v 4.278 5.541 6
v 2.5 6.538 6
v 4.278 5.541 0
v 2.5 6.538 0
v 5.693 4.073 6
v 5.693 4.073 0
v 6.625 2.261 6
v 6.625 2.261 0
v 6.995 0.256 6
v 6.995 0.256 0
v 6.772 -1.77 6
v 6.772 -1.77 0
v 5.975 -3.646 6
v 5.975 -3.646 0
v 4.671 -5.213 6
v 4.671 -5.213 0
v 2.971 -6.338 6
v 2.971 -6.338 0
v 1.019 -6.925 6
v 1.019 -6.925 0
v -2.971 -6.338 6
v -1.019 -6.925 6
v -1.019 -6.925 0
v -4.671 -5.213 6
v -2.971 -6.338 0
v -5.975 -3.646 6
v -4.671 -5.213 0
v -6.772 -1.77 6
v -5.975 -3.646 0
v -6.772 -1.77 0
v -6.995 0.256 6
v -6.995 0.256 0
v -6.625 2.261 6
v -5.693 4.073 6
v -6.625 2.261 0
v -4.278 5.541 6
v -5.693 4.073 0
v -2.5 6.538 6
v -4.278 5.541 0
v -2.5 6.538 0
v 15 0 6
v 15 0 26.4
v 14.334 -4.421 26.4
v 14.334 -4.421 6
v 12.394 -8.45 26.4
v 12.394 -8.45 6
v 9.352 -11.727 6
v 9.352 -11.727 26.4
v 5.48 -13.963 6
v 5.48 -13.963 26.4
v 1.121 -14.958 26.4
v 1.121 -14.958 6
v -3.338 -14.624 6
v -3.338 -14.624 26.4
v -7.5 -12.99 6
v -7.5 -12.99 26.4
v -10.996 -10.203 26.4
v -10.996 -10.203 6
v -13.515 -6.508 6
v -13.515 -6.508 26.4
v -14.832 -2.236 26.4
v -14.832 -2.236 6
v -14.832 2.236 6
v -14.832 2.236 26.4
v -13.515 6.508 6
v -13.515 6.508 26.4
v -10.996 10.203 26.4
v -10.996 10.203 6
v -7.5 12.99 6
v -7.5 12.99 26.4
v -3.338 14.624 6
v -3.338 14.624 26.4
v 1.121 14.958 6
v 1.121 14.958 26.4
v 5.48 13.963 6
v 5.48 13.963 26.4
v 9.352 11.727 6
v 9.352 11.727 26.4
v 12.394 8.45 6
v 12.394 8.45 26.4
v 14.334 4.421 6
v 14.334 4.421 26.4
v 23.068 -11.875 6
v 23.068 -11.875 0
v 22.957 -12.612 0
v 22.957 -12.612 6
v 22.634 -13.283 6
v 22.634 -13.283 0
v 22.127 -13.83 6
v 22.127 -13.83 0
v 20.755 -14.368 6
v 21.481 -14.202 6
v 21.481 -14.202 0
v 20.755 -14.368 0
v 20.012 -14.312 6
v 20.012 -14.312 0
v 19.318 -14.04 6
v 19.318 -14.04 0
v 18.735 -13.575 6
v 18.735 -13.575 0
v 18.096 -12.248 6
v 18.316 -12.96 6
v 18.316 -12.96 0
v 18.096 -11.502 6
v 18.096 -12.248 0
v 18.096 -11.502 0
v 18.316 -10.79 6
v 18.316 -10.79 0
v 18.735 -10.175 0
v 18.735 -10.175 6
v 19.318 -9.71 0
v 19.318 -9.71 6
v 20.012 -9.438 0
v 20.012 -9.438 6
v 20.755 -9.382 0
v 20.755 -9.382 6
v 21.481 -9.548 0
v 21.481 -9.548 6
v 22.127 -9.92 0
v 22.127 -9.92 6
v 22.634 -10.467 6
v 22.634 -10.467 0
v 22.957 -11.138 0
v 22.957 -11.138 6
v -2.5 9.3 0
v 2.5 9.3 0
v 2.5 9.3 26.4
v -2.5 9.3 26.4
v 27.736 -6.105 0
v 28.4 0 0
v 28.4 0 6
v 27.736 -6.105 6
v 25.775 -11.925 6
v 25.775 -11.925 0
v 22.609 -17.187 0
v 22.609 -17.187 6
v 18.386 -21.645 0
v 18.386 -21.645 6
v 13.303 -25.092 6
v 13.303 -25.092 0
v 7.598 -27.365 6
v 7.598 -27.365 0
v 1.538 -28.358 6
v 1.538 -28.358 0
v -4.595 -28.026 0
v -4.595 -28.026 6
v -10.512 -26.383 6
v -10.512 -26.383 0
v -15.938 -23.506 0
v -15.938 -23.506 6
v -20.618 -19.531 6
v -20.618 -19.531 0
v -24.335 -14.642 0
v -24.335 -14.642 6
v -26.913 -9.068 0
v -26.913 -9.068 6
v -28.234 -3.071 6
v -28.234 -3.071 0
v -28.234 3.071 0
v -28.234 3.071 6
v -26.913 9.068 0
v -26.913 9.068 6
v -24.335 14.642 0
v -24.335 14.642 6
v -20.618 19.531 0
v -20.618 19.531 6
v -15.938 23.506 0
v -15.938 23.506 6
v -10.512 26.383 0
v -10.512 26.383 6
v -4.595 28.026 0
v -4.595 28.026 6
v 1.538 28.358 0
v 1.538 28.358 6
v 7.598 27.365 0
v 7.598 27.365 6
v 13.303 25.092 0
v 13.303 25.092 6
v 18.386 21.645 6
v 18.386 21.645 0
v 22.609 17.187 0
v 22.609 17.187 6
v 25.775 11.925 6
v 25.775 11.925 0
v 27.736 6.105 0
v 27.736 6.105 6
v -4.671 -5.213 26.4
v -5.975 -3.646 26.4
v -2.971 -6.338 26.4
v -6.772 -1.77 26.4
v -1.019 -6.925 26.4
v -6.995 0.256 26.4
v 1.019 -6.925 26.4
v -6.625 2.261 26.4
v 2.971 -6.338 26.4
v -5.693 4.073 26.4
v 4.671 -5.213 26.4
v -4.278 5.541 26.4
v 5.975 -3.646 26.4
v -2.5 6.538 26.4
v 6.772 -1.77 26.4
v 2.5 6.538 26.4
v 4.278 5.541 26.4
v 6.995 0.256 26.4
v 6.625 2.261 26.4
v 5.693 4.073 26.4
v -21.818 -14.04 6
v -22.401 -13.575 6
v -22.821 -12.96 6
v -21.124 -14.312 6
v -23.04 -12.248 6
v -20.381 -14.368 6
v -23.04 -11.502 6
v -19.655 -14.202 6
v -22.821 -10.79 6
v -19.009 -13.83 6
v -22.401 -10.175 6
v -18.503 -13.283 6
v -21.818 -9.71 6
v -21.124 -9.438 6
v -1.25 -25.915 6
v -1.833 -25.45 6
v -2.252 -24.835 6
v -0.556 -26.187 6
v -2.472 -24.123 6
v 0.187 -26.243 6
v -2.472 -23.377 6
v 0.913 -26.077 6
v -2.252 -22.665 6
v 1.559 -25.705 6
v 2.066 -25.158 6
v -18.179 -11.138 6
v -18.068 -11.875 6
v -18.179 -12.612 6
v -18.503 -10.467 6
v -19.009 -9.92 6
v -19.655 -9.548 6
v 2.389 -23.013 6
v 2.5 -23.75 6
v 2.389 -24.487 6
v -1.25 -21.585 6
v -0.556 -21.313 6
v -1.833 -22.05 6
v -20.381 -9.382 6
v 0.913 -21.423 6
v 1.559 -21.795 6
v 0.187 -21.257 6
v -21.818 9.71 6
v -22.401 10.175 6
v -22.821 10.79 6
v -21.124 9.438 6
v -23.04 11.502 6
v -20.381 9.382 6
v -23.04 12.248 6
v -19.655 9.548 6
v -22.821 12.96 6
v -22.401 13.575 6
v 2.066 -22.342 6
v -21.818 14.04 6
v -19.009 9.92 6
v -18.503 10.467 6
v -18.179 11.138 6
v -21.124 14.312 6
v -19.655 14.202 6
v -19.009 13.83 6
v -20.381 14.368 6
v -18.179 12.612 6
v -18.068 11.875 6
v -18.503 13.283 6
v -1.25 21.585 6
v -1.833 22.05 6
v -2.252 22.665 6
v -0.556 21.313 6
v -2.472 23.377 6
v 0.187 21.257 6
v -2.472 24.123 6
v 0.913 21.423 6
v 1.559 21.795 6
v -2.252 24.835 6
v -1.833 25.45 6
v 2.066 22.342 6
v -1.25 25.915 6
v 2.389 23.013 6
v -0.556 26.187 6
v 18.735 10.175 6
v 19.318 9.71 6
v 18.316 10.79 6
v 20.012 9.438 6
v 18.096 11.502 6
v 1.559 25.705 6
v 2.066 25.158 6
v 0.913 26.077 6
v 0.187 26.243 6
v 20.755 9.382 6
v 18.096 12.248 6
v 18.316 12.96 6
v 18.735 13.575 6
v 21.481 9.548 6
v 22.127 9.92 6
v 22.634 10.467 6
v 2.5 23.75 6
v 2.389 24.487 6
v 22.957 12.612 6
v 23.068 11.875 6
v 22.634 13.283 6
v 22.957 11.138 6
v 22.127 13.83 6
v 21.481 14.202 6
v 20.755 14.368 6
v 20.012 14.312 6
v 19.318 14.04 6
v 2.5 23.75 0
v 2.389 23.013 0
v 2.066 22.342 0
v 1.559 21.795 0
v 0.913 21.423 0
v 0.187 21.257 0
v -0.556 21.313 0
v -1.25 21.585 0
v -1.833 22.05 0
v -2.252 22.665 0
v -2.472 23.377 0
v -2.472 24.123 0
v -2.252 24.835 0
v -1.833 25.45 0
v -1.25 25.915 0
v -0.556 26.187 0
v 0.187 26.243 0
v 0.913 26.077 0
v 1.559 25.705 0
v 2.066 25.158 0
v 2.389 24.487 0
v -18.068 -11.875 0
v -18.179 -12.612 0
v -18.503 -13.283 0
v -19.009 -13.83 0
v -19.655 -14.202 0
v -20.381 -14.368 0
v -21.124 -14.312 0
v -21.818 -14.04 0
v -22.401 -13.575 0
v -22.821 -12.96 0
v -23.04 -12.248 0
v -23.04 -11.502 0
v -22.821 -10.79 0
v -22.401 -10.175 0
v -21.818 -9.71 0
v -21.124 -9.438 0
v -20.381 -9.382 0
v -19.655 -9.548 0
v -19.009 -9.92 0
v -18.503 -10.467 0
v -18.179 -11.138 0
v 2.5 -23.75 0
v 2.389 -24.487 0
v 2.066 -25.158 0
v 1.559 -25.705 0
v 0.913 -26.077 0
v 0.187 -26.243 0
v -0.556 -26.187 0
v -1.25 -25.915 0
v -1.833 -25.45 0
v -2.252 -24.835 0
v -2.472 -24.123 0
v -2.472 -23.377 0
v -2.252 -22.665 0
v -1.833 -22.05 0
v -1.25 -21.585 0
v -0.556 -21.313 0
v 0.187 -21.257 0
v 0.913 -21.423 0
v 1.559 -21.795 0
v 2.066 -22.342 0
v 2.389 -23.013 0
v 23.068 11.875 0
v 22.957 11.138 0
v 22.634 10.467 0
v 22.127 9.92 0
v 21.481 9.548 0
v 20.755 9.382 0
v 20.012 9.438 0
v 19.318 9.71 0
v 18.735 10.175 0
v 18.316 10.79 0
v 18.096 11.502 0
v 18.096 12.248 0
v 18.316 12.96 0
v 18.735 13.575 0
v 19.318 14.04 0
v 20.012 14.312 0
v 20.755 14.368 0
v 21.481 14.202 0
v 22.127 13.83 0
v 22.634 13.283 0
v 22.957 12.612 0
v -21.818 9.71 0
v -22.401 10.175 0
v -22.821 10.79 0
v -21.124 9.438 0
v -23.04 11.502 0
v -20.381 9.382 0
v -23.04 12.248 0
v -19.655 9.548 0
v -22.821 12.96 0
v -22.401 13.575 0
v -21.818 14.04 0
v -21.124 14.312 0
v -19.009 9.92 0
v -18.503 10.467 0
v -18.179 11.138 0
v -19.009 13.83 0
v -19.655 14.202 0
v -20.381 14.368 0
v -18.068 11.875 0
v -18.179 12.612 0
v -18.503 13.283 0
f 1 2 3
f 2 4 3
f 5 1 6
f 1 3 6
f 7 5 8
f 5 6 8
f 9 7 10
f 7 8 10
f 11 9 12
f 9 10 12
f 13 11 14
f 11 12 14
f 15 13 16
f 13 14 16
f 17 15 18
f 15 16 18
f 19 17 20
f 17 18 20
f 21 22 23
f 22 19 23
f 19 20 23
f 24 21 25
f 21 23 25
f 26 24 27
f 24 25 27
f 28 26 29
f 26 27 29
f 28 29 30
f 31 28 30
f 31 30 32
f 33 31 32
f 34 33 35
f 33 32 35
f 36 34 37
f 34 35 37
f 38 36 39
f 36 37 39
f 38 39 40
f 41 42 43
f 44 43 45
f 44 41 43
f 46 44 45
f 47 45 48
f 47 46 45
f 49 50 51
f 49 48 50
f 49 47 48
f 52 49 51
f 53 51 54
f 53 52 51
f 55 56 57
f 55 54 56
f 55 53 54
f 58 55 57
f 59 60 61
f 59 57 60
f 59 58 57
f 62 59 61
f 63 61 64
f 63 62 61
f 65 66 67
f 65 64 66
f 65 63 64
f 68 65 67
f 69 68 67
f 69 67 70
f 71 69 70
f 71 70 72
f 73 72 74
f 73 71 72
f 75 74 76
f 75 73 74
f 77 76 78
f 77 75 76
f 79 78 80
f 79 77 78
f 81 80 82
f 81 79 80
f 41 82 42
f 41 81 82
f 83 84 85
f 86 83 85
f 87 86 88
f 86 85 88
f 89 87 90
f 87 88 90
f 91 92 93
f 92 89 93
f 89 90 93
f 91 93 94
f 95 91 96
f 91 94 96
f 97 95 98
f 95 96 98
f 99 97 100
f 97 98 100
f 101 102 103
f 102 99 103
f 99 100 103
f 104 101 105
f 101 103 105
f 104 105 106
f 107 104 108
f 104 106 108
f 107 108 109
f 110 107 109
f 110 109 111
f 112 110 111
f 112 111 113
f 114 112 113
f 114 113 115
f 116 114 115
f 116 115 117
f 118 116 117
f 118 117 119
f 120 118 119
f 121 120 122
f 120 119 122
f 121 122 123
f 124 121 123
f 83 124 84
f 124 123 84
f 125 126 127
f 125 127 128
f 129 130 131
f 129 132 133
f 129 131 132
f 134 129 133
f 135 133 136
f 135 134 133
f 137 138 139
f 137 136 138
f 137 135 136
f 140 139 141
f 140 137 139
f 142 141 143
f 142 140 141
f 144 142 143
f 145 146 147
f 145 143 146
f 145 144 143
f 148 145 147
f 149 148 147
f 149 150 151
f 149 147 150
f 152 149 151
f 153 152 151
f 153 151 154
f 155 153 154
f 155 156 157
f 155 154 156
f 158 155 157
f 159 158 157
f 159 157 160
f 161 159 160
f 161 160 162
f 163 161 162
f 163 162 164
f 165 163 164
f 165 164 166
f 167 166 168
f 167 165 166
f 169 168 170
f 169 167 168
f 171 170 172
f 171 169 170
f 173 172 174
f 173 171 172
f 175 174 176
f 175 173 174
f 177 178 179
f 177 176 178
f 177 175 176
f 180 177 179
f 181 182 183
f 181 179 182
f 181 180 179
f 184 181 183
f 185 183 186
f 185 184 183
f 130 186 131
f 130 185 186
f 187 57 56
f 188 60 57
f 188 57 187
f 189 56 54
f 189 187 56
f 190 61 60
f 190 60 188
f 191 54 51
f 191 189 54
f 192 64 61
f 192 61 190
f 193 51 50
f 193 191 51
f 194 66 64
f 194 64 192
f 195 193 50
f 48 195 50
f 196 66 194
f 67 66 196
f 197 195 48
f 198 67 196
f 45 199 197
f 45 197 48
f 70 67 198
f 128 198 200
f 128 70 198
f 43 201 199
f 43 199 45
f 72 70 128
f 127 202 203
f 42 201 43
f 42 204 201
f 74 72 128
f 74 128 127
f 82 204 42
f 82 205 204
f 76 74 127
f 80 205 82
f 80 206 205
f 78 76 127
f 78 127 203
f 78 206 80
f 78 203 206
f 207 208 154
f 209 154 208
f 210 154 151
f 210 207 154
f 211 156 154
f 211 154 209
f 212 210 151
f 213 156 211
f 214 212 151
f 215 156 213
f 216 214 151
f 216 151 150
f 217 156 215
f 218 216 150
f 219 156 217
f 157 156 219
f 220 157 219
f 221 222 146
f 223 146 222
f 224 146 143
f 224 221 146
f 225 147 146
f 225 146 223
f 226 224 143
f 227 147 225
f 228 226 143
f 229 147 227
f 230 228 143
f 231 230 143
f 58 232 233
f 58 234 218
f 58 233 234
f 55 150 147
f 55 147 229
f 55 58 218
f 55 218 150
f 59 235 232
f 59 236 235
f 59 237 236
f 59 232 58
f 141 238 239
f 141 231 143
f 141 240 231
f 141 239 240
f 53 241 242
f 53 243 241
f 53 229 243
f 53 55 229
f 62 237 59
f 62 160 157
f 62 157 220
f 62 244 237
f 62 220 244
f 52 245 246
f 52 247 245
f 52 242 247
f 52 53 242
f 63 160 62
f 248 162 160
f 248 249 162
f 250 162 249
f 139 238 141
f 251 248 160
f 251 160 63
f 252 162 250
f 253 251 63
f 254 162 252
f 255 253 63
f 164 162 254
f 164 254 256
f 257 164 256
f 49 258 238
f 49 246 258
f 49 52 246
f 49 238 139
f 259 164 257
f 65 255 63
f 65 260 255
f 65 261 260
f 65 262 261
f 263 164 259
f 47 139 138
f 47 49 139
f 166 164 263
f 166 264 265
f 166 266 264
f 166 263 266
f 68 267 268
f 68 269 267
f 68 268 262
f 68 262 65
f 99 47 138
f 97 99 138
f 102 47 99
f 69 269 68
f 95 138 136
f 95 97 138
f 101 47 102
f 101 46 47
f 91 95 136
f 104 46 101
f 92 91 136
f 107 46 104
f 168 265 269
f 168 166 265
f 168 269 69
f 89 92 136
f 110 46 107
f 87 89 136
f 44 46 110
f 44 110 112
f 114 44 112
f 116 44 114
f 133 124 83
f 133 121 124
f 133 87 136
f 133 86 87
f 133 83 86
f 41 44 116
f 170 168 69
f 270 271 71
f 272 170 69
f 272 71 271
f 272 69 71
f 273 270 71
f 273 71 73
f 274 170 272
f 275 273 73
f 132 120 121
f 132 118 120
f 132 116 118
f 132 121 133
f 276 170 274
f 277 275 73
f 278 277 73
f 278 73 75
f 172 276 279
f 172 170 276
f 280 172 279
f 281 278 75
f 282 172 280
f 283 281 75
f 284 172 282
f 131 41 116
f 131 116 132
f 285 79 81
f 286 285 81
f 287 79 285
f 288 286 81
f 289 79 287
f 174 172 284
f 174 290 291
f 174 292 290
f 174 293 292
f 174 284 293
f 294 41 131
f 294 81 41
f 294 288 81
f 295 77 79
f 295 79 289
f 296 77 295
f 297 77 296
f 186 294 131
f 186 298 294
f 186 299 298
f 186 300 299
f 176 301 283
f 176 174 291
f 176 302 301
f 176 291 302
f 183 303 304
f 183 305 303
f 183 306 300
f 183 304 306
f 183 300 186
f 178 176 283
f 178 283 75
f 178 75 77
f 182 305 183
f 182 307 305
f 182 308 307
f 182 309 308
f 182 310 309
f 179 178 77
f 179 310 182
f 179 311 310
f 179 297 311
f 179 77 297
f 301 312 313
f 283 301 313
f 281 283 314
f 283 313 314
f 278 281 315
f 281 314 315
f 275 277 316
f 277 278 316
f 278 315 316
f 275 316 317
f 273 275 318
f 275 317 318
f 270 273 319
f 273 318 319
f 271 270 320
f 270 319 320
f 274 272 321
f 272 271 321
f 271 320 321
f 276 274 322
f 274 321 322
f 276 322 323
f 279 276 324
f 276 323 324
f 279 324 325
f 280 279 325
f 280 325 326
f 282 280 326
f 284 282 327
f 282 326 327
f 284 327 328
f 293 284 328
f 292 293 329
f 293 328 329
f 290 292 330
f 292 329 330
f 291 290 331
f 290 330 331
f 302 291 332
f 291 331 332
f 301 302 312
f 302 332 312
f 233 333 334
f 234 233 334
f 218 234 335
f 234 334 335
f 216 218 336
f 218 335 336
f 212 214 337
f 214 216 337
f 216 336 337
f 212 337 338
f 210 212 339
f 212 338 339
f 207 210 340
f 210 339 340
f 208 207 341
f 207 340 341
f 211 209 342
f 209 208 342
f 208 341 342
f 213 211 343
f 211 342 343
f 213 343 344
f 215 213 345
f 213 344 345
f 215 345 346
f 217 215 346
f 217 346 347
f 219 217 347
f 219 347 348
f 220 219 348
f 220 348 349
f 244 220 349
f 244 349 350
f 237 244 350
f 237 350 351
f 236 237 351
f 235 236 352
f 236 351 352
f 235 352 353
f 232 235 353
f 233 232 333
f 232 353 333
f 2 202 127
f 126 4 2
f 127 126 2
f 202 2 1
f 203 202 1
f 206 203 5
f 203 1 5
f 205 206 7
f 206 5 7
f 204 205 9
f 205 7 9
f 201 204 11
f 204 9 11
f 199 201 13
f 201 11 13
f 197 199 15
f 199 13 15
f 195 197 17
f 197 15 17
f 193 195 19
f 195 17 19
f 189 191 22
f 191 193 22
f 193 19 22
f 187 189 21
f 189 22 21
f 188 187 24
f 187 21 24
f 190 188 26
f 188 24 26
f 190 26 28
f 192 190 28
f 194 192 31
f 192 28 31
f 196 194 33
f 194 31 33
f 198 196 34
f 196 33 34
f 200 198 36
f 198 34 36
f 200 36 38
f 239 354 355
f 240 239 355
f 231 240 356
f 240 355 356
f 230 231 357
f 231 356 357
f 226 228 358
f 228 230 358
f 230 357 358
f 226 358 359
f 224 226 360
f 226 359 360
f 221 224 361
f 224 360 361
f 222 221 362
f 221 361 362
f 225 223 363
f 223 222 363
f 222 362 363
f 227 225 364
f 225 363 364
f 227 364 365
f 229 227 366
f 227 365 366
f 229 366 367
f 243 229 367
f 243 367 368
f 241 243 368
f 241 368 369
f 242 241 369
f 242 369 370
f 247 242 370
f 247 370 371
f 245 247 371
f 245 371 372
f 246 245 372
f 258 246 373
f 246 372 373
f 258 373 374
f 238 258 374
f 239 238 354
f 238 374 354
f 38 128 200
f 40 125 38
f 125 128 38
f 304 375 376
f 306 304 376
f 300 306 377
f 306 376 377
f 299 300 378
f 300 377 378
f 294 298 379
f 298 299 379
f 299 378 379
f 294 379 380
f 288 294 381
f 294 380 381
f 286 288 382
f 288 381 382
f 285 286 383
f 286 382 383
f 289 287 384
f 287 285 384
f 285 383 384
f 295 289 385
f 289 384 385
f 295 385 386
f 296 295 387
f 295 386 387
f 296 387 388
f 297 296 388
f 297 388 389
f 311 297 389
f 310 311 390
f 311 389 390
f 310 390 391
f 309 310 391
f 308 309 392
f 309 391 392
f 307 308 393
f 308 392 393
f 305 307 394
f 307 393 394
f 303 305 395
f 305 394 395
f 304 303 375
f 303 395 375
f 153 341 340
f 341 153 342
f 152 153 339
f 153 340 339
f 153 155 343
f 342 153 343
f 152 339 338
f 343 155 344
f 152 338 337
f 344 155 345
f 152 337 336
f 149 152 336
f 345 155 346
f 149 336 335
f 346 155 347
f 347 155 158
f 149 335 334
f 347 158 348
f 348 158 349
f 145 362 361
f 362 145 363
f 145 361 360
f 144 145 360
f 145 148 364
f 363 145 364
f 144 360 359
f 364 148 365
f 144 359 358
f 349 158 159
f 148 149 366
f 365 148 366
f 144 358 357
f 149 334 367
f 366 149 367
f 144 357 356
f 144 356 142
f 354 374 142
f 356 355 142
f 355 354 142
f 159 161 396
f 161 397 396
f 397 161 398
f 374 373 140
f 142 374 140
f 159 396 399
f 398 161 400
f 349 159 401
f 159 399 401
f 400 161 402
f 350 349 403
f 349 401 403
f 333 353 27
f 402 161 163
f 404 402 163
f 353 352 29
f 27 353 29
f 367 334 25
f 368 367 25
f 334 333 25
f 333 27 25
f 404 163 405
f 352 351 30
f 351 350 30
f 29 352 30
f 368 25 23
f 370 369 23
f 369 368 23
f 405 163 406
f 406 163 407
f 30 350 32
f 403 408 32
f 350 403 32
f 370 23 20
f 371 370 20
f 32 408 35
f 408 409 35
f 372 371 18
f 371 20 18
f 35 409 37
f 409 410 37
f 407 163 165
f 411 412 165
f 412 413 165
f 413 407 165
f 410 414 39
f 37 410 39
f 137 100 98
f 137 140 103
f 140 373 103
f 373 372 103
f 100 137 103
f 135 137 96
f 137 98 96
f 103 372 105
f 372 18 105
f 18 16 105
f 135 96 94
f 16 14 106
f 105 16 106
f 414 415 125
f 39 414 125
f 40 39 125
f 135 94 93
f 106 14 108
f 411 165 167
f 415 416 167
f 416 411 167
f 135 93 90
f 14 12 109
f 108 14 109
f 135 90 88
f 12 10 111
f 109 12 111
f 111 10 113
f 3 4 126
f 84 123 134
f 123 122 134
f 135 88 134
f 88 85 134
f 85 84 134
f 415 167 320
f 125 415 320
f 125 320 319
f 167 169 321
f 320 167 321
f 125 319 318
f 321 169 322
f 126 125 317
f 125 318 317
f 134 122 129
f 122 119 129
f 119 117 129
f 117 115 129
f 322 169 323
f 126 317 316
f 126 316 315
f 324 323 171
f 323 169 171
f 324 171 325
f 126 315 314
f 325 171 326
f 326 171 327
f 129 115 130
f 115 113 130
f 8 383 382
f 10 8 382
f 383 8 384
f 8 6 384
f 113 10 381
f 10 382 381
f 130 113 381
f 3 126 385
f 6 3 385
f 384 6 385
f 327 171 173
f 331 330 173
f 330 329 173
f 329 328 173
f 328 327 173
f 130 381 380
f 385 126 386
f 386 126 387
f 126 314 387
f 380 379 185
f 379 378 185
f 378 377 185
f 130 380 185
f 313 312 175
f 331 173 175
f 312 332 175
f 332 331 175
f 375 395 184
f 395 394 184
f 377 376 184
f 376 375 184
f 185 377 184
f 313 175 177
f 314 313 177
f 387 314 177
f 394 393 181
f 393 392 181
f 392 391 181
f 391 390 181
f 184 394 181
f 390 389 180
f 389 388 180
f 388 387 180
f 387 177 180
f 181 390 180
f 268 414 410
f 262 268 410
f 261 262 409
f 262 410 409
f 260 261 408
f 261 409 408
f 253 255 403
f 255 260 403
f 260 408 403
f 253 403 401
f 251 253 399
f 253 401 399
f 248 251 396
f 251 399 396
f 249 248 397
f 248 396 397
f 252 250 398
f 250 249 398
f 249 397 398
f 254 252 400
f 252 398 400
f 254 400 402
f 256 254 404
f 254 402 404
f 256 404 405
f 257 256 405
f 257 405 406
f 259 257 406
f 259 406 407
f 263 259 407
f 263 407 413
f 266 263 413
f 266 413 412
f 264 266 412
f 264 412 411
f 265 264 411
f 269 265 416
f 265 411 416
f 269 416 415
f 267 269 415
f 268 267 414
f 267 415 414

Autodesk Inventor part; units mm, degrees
ref_plane "YZ Plane" through (0, 0, 0) normal (1, 0, 0) x (0, 1, 0)
ref_plane "XZ Plane" through (0, 0, 0) normal (0, 1, 0) x (-1, 0, 0)
ref_plane "XY Plane" through (0, 0, 0) normal (0, 0, 1) x (1, 0, 0)
sketch "Base" plane through (0, 0, 0) normal (0, 0, 1) x (1, 0, 0)
  circle A0 centre (0, 0) radius 28.4
  circle A1 centre (0, 0) radius 23.75 construction
  circle A2 centre (0, 0) radius 7
  line L0 (-2.5, 0) -> (2.5, 0)
  line L1 (2.5, 0) -> (2.5, 9.3)
  line L2 (2.5, 9.3) -> (-2.5, 9.3)
  line L3 (-2.5, 9.3) -> (-2.5, 0)
  line L4 (0, -39.76) -> (0, 39.76) construction
  circle A3 centre (0, 23.75) radius 2.5
  circle A4 centre (-20.5681, 11.875) radius 2.5
  circle A5 centre (-20.5681, -11.875) radius 2.5
  circle A6 centre (0, -23.75) radius 2.5
  circle A7 centre (20.5681, -11.875) radius 2.5
  circle A8 centre (20.5681, 11.875) radius 2.5
  point P0 (0, 9.3)
  point P1 (2.5, 6.5383)
  point P2 (-2.5, 6.5383)
  dimension "d1" = 47.5
  dimension "d0" = 56.8
  dimension "d2" = 14
  dimension "d3" = 9.3
  dimension "d4" = 5
  dimension "d5" = 5
  dimension "d8" = 360
extrude "BaseFeature" add sketch "Base" along normal blind 6
sketch "Lip" plane through (0, 0, 6) normal (0, 0, 1) x (1, 0, 0)
  arc A0 (-2.5, 6.5383) -> (2.5, 6.5383) centre (0, 0) ccw projected
  circle A1 centre (0, 0) radius 15
  line L0 (-2.5, 6.5383) -> (-2.5, 9.3) projected
  line L1 (2.5, 9.3) -> (2.5, 6.5383) projected
  line L2 (-2.5, 9.3) -> (2.5, 9.3) projected
  dimension "d12" = 30
extrude "LipFeature" add sketch "Lip" along normal blind 20.4
properties part number "NexusRobot14mmKeywayHub"
